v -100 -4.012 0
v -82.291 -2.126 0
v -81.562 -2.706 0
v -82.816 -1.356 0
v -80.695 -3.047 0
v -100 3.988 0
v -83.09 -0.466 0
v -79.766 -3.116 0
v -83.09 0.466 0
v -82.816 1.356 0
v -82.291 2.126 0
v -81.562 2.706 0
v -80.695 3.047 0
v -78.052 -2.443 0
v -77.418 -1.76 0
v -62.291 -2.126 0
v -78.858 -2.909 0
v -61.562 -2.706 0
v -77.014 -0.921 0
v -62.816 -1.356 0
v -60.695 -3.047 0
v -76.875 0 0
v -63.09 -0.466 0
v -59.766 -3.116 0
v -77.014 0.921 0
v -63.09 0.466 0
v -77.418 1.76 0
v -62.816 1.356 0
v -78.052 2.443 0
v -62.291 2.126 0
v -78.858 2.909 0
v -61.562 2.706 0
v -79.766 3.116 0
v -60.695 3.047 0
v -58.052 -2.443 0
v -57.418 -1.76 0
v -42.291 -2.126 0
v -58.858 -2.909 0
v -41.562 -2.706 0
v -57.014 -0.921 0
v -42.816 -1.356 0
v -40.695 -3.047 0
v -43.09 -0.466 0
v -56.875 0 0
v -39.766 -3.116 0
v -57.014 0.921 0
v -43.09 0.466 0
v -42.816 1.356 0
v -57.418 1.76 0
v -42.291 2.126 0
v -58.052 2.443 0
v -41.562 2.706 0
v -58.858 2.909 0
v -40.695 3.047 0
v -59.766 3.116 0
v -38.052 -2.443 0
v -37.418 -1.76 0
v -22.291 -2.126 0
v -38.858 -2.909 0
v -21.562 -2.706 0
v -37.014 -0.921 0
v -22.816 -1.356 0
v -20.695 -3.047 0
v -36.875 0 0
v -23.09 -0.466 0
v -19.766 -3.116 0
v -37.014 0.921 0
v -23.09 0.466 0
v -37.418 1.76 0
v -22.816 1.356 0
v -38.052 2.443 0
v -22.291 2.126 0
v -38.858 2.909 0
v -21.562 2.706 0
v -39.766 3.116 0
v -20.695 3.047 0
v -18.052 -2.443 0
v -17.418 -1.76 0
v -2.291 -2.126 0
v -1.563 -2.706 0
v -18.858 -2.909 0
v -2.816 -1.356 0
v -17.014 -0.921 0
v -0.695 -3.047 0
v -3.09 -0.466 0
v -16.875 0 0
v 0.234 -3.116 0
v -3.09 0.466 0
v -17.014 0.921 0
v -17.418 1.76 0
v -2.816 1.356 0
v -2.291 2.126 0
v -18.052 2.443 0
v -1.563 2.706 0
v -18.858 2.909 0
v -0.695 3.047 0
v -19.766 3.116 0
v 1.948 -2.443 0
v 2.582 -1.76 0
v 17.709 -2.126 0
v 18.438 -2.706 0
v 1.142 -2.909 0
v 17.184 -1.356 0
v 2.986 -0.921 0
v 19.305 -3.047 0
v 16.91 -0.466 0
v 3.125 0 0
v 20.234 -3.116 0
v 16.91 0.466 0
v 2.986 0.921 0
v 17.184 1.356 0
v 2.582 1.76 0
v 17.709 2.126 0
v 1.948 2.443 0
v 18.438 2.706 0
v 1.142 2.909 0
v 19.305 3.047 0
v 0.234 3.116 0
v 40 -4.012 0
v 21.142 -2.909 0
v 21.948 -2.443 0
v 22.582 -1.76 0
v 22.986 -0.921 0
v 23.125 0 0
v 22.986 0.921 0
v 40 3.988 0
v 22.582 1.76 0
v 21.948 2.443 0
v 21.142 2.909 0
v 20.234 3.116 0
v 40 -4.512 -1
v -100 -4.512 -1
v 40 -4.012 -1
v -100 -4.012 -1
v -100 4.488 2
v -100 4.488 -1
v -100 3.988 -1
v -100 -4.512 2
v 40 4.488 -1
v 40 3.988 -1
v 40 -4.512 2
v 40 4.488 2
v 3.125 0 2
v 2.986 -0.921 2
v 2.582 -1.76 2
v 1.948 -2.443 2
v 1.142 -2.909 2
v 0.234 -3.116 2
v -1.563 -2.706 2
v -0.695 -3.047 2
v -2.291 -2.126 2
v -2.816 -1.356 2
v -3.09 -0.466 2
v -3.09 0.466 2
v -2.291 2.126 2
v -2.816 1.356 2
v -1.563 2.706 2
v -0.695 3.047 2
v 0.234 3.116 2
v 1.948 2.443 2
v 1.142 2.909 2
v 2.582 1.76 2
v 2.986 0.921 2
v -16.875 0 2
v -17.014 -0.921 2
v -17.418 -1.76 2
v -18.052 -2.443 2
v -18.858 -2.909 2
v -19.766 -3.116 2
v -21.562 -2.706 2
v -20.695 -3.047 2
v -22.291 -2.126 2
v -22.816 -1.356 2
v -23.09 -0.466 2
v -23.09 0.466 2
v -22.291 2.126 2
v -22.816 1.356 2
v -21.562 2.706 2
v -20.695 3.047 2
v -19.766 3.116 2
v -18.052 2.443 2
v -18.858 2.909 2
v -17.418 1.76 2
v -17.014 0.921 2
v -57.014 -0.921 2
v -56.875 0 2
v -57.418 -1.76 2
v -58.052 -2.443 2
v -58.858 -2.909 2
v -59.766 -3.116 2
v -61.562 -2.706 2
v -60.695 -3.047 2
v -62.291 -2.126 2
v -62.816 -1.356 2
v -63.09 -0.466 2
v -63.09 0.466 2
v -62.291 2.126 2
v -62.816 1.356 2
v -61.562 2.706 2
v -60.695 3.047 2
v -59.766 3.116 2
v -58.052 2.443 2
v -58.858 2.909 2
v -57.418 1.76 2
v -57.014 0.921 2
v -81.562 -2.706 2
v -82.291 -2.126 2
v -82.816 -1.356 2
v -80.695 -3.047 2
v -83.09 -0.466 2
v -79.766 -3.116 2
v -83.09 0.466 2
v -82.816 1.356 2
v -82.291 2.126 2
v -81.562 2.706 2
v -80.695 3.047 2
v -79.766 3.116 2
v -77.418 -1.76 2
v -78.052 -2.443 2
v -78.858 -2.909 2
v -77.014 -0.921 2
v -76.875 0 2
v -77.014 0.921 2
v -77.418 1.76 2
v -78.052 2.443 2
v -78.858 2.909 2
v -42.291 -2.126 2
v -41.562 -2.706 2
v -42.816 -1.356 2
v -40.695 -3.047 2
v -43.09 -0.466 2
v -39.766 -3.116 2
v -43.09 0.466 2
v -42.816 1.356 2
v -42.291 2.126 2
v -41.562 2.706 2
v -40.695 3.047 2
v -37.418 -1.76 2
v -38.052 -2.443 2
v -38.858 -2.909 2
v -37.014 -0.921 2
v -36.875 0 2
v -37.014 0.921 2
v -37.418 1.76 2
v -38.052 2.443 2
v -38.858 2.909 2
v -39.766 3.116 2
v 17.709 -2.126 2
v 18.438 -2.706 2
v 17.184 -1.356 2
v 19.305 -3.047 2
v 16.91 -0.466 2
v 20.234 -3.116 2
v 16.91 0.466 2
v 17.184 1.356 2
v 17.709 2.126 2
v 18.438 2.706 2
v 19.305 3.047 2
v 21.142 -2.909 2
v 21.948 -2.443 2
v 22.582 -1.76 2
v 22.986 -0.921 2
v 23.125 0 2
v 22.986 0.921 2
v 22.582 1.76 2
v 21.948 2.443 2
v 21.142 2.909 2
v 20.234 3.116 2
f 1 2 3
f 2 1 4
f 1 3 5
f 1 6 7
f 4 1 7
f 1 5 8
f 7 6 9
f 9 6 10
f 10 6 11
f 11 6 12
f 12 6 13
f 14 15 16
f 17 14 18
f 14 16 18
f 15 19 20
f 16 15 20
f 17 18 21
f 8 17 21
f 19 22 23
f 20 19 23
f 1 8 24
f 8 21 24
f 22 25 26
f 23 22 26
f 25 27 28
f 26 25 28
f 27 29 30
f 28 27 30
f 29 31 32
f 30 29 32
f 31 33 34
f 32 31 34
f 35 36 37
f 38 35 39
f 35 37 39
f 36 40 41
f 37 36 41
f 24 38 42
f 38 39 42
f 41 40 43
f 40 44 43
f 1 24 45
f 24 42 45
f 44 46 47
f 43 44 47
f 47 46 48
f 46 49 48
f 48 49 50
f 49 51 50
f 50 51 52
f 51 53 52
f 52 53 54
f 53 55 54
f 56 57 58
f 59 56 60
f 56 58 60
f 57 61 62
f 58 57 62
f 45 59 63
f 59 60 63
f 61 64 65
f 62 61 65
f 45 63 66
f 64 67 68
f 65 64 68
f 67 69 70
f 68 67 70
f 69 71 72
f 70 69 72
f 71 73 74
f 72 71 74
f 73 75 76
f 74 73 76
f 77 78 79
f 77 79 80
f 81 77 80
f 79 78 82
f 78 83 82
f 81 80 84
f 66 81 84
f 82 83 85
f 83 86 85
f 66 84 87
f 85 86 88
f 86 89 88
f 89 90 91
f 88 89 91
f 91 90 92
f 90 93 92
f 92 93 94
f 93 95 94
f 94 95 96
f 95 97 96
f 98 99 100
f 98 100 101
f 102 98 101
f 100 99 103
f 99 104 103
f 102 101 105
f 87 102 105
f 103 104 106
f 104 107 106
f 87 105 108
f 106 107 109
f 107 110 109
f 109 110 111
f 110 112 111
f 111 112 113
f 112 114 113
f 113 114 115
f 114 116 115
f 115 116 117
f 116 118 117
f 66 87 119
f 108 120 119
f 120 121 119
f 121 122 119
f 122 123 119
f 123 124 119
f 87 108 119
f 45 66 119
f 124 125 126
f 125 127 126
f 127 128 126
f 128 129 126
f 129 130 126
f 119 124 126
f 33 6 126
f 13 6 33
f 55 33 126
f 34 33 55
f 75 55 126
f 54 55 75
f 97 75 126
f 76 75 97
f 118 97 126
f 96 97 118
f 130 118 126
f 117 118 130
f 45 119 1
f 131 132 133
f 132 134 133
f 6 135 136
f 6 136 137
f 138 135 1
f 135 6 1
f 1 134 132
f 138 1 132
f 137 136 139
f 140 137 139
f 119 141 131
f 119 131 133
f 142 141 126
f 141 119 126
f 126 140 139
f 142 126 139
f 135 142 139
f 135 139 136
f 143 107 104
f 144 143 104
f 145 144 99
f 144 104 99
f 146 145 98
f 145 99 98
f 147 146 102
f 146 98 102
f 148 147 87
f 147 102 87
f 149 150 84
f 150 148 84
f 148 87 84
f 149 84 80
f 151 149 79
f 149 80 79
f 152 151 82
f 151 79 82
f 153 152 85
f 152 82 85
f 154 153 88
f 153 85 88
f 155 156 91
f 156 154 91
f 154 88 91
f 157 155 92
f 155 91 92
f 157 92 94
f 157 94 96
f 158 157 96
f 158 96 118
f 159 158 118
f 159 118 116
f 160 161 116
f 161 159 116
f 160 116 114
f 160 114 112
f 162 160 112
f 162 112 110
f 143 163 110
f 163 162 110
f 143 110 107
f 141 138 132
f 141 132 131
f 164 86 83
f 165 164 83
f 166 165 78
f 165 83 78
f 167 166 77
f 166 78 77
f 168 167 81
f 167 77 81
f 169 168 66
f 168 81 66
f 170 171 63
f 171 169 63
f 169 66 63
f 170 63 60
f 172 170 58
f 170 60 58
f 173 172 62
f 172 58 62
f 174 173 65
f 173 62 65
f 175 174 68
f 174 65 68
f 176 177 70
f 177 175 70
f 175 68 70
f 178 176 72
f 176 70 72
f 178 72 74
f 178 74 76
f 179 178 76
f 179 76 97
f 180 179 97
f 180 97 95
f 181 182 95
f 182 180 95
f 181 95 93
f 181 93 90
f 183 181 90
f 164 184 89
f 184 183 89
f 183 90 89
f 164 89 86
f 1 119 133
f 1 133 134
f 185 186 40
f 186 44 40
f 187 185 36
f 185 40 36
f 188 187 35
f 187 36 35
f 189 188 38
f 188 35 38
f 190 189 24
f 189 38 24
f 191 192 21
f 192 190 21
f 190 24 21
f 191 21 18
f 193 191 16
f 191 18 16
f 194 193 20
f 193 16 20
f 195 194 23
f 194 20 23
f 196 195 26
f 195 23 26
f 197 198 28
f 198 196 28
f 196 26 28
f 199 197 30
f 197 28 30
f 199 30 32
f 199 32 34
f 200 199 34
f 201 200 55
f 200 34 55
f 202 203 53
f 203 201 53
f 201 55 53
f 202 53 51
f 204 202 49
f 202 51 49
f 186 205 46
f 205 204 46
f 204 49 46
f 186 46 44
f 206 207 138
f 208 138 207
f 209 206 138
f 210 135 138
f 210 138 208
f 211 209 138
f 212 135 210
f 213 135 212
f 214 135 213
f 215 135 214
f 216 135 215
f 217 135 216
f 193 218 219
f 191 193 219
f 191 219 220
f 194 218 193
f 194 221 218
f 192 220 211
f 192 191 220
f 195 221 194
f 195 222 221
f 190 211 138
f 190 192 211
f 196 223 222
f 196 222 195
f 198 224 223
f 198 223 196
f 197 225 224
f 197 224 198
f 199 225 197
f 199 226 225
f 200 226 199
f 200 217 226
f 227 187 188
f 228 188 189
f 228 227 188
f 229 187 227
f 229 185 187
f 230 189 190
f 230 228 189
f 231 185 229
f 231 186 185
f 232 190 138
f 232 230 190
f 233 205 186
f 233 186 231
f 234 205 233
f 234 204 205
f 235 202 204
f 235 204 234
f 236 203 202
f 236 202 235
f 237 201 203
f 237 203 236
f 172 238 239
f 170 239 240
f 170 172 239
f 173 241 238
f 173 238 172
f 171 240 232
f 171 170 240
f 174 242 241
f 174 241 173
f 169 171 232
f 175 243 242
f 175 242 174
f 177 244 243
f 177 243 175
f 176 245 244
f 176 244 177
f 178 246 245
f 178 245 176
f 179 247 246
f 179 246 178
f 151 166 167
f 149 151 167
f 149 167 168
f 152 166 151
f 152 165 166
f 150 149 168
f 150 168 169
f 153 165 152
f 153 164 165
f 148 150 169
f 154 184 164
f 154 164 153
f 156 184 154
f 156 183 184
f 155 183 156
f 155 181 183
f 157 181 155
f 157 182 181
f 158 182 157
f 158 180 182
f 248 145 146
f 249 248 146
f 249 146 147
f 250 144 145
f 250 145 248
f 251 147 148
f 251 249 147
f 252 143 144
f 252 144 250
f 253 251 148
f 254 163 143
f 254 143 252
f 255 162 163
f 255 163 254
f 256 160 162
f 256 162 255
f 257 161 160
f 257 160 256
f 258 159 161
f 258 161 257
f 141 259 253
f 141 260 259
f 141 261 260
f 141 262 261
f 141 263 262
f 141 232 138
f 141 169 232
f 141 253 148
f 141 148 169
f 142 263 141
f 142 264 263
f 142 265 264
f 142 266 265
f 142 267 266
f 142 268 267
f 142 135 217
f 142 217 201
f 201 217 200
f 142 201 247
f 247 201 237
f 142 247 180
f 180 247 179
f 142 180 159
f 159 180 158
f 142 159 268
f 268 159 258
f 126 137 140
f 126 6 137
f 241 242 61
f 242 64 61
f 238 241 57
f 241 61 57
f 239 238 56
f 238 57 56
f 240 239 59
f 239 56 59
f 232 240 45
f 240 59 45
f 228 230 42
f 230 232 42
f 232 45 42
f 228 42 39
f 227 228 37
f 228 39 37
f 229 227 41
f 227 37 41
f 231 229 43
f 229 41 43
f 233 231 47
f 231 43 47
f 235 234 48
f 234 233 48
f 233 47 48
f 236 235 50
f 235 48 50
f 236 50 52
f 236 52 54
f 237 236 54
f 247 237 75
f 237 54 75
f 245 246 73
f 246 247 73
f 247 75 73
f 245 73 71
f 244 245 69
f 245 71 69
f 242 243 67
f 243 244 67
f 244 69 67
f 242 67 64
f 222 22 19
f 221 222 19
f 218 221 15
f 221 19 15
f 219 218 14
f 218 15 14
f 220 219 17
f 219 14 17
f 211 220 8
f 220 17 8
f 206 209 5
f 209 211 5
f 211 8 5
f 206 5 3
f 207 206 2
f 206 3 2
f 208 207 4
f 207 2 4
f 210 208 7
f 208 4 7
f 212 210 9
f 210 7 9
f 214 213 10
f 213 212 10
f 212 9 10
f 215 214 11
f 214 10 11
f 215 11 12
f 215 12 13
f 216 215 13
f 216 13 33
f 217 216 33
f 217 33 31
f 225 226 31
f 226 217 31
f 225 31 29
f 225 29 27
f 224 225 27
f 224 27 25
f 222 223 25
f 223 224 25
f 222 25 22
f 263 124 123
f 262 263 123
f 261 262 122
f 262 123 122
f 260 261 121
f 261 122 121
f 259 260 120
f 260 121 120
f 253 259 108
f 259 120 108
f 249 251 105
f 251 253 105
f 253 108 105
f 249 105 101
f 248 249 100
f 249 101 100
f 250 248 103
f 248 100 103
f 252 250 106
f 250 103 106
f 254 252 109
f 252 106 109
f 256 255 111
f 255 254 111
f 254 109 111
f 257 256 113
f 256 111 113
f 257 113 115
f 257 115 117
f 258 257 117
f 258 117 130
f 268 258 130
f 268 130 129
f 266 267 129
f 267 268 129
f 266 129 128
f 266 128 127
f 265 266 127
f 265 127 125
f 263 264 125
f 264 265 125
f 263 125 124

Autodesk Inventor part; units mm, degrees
ref_plane "YZ Plane" through (0, 0, 0) normal (1, 0, 0) x (0, 1, 0)
ref_plane "XZ Plane" through (0, 0, 0) normal (0, 1, 0) x (-1, 0, 0)
ref_plane "XY Plane" through (0, 0, 0) normal (0, 0, 1) x (1, 0, 0)
sketch "Esquisse1" plane through (0, 0, 0) normal (0, 0, 1) x (1, 0, 0)
  line L0 (40, 3.9877) -> (-100, 3.9877)
  line L1 (-100, 3.9877) -> (-100, -4.0123)
  line L2 (-100, -4.0123) -> (40, -4.0123)
  line L3 (40, -4.0123) -> (40, 3.9877)
  circle A0 centre (0, 0) radius 3.125
  line L4 (15.1704, 0) -> (0, 0) construction
  circle A1 centre (-20, 0) radius 3.125
  circle A2 centre (-40, 0) radius 3.125
  circle A3 centre (-60, 0) radius 3.125
  circle A4 centre (-80, 0) radius 3.125
  circle A5 centre (20, 0) radius 3.125
  dimension "d0" = 8
  dimension "d1" = 140
  dimension "d2" = 40
  dimension "d3" = 6.25
  dimension "d6" = 20
  dimension "d13" = 20
extrude "Extrusion1" add sketch "Esquisse1" along normal blind 2
sketch "Esquisse2" plane through (0, 0, 2) normal (0, 0, 1) x (1, 0, 0)
  line L0 (-100, 3.9877) -> (40, 3.9877)
  line L1 (40, 3.9877) -> (40, 4.4877)
  line L2 (40, 4.4877) -> (-100, 4.4877)
  line L3 (-100, 4.4877) -> (-100, 3.9877)
  line L4 (40, -4.0123) -> (-100, -4.0123)
  line L5 (-100, -4.0123) -> (-100, -4.5123)
  line L6 (-100, -4.5123) -> (40, -4.5123)
  line L7 (40, -4.5123) -> (40, -4.0123)
  point P0 (0, 0)
  dimension "d20" = 140
  dimension "d21" = 140
  dimension "d22" = 0.5
  dimension "d23" = 0.5
extrude "Extrusion2" add sketch "Esquisse2" against normal blind 3
properties part number "couvercle"
